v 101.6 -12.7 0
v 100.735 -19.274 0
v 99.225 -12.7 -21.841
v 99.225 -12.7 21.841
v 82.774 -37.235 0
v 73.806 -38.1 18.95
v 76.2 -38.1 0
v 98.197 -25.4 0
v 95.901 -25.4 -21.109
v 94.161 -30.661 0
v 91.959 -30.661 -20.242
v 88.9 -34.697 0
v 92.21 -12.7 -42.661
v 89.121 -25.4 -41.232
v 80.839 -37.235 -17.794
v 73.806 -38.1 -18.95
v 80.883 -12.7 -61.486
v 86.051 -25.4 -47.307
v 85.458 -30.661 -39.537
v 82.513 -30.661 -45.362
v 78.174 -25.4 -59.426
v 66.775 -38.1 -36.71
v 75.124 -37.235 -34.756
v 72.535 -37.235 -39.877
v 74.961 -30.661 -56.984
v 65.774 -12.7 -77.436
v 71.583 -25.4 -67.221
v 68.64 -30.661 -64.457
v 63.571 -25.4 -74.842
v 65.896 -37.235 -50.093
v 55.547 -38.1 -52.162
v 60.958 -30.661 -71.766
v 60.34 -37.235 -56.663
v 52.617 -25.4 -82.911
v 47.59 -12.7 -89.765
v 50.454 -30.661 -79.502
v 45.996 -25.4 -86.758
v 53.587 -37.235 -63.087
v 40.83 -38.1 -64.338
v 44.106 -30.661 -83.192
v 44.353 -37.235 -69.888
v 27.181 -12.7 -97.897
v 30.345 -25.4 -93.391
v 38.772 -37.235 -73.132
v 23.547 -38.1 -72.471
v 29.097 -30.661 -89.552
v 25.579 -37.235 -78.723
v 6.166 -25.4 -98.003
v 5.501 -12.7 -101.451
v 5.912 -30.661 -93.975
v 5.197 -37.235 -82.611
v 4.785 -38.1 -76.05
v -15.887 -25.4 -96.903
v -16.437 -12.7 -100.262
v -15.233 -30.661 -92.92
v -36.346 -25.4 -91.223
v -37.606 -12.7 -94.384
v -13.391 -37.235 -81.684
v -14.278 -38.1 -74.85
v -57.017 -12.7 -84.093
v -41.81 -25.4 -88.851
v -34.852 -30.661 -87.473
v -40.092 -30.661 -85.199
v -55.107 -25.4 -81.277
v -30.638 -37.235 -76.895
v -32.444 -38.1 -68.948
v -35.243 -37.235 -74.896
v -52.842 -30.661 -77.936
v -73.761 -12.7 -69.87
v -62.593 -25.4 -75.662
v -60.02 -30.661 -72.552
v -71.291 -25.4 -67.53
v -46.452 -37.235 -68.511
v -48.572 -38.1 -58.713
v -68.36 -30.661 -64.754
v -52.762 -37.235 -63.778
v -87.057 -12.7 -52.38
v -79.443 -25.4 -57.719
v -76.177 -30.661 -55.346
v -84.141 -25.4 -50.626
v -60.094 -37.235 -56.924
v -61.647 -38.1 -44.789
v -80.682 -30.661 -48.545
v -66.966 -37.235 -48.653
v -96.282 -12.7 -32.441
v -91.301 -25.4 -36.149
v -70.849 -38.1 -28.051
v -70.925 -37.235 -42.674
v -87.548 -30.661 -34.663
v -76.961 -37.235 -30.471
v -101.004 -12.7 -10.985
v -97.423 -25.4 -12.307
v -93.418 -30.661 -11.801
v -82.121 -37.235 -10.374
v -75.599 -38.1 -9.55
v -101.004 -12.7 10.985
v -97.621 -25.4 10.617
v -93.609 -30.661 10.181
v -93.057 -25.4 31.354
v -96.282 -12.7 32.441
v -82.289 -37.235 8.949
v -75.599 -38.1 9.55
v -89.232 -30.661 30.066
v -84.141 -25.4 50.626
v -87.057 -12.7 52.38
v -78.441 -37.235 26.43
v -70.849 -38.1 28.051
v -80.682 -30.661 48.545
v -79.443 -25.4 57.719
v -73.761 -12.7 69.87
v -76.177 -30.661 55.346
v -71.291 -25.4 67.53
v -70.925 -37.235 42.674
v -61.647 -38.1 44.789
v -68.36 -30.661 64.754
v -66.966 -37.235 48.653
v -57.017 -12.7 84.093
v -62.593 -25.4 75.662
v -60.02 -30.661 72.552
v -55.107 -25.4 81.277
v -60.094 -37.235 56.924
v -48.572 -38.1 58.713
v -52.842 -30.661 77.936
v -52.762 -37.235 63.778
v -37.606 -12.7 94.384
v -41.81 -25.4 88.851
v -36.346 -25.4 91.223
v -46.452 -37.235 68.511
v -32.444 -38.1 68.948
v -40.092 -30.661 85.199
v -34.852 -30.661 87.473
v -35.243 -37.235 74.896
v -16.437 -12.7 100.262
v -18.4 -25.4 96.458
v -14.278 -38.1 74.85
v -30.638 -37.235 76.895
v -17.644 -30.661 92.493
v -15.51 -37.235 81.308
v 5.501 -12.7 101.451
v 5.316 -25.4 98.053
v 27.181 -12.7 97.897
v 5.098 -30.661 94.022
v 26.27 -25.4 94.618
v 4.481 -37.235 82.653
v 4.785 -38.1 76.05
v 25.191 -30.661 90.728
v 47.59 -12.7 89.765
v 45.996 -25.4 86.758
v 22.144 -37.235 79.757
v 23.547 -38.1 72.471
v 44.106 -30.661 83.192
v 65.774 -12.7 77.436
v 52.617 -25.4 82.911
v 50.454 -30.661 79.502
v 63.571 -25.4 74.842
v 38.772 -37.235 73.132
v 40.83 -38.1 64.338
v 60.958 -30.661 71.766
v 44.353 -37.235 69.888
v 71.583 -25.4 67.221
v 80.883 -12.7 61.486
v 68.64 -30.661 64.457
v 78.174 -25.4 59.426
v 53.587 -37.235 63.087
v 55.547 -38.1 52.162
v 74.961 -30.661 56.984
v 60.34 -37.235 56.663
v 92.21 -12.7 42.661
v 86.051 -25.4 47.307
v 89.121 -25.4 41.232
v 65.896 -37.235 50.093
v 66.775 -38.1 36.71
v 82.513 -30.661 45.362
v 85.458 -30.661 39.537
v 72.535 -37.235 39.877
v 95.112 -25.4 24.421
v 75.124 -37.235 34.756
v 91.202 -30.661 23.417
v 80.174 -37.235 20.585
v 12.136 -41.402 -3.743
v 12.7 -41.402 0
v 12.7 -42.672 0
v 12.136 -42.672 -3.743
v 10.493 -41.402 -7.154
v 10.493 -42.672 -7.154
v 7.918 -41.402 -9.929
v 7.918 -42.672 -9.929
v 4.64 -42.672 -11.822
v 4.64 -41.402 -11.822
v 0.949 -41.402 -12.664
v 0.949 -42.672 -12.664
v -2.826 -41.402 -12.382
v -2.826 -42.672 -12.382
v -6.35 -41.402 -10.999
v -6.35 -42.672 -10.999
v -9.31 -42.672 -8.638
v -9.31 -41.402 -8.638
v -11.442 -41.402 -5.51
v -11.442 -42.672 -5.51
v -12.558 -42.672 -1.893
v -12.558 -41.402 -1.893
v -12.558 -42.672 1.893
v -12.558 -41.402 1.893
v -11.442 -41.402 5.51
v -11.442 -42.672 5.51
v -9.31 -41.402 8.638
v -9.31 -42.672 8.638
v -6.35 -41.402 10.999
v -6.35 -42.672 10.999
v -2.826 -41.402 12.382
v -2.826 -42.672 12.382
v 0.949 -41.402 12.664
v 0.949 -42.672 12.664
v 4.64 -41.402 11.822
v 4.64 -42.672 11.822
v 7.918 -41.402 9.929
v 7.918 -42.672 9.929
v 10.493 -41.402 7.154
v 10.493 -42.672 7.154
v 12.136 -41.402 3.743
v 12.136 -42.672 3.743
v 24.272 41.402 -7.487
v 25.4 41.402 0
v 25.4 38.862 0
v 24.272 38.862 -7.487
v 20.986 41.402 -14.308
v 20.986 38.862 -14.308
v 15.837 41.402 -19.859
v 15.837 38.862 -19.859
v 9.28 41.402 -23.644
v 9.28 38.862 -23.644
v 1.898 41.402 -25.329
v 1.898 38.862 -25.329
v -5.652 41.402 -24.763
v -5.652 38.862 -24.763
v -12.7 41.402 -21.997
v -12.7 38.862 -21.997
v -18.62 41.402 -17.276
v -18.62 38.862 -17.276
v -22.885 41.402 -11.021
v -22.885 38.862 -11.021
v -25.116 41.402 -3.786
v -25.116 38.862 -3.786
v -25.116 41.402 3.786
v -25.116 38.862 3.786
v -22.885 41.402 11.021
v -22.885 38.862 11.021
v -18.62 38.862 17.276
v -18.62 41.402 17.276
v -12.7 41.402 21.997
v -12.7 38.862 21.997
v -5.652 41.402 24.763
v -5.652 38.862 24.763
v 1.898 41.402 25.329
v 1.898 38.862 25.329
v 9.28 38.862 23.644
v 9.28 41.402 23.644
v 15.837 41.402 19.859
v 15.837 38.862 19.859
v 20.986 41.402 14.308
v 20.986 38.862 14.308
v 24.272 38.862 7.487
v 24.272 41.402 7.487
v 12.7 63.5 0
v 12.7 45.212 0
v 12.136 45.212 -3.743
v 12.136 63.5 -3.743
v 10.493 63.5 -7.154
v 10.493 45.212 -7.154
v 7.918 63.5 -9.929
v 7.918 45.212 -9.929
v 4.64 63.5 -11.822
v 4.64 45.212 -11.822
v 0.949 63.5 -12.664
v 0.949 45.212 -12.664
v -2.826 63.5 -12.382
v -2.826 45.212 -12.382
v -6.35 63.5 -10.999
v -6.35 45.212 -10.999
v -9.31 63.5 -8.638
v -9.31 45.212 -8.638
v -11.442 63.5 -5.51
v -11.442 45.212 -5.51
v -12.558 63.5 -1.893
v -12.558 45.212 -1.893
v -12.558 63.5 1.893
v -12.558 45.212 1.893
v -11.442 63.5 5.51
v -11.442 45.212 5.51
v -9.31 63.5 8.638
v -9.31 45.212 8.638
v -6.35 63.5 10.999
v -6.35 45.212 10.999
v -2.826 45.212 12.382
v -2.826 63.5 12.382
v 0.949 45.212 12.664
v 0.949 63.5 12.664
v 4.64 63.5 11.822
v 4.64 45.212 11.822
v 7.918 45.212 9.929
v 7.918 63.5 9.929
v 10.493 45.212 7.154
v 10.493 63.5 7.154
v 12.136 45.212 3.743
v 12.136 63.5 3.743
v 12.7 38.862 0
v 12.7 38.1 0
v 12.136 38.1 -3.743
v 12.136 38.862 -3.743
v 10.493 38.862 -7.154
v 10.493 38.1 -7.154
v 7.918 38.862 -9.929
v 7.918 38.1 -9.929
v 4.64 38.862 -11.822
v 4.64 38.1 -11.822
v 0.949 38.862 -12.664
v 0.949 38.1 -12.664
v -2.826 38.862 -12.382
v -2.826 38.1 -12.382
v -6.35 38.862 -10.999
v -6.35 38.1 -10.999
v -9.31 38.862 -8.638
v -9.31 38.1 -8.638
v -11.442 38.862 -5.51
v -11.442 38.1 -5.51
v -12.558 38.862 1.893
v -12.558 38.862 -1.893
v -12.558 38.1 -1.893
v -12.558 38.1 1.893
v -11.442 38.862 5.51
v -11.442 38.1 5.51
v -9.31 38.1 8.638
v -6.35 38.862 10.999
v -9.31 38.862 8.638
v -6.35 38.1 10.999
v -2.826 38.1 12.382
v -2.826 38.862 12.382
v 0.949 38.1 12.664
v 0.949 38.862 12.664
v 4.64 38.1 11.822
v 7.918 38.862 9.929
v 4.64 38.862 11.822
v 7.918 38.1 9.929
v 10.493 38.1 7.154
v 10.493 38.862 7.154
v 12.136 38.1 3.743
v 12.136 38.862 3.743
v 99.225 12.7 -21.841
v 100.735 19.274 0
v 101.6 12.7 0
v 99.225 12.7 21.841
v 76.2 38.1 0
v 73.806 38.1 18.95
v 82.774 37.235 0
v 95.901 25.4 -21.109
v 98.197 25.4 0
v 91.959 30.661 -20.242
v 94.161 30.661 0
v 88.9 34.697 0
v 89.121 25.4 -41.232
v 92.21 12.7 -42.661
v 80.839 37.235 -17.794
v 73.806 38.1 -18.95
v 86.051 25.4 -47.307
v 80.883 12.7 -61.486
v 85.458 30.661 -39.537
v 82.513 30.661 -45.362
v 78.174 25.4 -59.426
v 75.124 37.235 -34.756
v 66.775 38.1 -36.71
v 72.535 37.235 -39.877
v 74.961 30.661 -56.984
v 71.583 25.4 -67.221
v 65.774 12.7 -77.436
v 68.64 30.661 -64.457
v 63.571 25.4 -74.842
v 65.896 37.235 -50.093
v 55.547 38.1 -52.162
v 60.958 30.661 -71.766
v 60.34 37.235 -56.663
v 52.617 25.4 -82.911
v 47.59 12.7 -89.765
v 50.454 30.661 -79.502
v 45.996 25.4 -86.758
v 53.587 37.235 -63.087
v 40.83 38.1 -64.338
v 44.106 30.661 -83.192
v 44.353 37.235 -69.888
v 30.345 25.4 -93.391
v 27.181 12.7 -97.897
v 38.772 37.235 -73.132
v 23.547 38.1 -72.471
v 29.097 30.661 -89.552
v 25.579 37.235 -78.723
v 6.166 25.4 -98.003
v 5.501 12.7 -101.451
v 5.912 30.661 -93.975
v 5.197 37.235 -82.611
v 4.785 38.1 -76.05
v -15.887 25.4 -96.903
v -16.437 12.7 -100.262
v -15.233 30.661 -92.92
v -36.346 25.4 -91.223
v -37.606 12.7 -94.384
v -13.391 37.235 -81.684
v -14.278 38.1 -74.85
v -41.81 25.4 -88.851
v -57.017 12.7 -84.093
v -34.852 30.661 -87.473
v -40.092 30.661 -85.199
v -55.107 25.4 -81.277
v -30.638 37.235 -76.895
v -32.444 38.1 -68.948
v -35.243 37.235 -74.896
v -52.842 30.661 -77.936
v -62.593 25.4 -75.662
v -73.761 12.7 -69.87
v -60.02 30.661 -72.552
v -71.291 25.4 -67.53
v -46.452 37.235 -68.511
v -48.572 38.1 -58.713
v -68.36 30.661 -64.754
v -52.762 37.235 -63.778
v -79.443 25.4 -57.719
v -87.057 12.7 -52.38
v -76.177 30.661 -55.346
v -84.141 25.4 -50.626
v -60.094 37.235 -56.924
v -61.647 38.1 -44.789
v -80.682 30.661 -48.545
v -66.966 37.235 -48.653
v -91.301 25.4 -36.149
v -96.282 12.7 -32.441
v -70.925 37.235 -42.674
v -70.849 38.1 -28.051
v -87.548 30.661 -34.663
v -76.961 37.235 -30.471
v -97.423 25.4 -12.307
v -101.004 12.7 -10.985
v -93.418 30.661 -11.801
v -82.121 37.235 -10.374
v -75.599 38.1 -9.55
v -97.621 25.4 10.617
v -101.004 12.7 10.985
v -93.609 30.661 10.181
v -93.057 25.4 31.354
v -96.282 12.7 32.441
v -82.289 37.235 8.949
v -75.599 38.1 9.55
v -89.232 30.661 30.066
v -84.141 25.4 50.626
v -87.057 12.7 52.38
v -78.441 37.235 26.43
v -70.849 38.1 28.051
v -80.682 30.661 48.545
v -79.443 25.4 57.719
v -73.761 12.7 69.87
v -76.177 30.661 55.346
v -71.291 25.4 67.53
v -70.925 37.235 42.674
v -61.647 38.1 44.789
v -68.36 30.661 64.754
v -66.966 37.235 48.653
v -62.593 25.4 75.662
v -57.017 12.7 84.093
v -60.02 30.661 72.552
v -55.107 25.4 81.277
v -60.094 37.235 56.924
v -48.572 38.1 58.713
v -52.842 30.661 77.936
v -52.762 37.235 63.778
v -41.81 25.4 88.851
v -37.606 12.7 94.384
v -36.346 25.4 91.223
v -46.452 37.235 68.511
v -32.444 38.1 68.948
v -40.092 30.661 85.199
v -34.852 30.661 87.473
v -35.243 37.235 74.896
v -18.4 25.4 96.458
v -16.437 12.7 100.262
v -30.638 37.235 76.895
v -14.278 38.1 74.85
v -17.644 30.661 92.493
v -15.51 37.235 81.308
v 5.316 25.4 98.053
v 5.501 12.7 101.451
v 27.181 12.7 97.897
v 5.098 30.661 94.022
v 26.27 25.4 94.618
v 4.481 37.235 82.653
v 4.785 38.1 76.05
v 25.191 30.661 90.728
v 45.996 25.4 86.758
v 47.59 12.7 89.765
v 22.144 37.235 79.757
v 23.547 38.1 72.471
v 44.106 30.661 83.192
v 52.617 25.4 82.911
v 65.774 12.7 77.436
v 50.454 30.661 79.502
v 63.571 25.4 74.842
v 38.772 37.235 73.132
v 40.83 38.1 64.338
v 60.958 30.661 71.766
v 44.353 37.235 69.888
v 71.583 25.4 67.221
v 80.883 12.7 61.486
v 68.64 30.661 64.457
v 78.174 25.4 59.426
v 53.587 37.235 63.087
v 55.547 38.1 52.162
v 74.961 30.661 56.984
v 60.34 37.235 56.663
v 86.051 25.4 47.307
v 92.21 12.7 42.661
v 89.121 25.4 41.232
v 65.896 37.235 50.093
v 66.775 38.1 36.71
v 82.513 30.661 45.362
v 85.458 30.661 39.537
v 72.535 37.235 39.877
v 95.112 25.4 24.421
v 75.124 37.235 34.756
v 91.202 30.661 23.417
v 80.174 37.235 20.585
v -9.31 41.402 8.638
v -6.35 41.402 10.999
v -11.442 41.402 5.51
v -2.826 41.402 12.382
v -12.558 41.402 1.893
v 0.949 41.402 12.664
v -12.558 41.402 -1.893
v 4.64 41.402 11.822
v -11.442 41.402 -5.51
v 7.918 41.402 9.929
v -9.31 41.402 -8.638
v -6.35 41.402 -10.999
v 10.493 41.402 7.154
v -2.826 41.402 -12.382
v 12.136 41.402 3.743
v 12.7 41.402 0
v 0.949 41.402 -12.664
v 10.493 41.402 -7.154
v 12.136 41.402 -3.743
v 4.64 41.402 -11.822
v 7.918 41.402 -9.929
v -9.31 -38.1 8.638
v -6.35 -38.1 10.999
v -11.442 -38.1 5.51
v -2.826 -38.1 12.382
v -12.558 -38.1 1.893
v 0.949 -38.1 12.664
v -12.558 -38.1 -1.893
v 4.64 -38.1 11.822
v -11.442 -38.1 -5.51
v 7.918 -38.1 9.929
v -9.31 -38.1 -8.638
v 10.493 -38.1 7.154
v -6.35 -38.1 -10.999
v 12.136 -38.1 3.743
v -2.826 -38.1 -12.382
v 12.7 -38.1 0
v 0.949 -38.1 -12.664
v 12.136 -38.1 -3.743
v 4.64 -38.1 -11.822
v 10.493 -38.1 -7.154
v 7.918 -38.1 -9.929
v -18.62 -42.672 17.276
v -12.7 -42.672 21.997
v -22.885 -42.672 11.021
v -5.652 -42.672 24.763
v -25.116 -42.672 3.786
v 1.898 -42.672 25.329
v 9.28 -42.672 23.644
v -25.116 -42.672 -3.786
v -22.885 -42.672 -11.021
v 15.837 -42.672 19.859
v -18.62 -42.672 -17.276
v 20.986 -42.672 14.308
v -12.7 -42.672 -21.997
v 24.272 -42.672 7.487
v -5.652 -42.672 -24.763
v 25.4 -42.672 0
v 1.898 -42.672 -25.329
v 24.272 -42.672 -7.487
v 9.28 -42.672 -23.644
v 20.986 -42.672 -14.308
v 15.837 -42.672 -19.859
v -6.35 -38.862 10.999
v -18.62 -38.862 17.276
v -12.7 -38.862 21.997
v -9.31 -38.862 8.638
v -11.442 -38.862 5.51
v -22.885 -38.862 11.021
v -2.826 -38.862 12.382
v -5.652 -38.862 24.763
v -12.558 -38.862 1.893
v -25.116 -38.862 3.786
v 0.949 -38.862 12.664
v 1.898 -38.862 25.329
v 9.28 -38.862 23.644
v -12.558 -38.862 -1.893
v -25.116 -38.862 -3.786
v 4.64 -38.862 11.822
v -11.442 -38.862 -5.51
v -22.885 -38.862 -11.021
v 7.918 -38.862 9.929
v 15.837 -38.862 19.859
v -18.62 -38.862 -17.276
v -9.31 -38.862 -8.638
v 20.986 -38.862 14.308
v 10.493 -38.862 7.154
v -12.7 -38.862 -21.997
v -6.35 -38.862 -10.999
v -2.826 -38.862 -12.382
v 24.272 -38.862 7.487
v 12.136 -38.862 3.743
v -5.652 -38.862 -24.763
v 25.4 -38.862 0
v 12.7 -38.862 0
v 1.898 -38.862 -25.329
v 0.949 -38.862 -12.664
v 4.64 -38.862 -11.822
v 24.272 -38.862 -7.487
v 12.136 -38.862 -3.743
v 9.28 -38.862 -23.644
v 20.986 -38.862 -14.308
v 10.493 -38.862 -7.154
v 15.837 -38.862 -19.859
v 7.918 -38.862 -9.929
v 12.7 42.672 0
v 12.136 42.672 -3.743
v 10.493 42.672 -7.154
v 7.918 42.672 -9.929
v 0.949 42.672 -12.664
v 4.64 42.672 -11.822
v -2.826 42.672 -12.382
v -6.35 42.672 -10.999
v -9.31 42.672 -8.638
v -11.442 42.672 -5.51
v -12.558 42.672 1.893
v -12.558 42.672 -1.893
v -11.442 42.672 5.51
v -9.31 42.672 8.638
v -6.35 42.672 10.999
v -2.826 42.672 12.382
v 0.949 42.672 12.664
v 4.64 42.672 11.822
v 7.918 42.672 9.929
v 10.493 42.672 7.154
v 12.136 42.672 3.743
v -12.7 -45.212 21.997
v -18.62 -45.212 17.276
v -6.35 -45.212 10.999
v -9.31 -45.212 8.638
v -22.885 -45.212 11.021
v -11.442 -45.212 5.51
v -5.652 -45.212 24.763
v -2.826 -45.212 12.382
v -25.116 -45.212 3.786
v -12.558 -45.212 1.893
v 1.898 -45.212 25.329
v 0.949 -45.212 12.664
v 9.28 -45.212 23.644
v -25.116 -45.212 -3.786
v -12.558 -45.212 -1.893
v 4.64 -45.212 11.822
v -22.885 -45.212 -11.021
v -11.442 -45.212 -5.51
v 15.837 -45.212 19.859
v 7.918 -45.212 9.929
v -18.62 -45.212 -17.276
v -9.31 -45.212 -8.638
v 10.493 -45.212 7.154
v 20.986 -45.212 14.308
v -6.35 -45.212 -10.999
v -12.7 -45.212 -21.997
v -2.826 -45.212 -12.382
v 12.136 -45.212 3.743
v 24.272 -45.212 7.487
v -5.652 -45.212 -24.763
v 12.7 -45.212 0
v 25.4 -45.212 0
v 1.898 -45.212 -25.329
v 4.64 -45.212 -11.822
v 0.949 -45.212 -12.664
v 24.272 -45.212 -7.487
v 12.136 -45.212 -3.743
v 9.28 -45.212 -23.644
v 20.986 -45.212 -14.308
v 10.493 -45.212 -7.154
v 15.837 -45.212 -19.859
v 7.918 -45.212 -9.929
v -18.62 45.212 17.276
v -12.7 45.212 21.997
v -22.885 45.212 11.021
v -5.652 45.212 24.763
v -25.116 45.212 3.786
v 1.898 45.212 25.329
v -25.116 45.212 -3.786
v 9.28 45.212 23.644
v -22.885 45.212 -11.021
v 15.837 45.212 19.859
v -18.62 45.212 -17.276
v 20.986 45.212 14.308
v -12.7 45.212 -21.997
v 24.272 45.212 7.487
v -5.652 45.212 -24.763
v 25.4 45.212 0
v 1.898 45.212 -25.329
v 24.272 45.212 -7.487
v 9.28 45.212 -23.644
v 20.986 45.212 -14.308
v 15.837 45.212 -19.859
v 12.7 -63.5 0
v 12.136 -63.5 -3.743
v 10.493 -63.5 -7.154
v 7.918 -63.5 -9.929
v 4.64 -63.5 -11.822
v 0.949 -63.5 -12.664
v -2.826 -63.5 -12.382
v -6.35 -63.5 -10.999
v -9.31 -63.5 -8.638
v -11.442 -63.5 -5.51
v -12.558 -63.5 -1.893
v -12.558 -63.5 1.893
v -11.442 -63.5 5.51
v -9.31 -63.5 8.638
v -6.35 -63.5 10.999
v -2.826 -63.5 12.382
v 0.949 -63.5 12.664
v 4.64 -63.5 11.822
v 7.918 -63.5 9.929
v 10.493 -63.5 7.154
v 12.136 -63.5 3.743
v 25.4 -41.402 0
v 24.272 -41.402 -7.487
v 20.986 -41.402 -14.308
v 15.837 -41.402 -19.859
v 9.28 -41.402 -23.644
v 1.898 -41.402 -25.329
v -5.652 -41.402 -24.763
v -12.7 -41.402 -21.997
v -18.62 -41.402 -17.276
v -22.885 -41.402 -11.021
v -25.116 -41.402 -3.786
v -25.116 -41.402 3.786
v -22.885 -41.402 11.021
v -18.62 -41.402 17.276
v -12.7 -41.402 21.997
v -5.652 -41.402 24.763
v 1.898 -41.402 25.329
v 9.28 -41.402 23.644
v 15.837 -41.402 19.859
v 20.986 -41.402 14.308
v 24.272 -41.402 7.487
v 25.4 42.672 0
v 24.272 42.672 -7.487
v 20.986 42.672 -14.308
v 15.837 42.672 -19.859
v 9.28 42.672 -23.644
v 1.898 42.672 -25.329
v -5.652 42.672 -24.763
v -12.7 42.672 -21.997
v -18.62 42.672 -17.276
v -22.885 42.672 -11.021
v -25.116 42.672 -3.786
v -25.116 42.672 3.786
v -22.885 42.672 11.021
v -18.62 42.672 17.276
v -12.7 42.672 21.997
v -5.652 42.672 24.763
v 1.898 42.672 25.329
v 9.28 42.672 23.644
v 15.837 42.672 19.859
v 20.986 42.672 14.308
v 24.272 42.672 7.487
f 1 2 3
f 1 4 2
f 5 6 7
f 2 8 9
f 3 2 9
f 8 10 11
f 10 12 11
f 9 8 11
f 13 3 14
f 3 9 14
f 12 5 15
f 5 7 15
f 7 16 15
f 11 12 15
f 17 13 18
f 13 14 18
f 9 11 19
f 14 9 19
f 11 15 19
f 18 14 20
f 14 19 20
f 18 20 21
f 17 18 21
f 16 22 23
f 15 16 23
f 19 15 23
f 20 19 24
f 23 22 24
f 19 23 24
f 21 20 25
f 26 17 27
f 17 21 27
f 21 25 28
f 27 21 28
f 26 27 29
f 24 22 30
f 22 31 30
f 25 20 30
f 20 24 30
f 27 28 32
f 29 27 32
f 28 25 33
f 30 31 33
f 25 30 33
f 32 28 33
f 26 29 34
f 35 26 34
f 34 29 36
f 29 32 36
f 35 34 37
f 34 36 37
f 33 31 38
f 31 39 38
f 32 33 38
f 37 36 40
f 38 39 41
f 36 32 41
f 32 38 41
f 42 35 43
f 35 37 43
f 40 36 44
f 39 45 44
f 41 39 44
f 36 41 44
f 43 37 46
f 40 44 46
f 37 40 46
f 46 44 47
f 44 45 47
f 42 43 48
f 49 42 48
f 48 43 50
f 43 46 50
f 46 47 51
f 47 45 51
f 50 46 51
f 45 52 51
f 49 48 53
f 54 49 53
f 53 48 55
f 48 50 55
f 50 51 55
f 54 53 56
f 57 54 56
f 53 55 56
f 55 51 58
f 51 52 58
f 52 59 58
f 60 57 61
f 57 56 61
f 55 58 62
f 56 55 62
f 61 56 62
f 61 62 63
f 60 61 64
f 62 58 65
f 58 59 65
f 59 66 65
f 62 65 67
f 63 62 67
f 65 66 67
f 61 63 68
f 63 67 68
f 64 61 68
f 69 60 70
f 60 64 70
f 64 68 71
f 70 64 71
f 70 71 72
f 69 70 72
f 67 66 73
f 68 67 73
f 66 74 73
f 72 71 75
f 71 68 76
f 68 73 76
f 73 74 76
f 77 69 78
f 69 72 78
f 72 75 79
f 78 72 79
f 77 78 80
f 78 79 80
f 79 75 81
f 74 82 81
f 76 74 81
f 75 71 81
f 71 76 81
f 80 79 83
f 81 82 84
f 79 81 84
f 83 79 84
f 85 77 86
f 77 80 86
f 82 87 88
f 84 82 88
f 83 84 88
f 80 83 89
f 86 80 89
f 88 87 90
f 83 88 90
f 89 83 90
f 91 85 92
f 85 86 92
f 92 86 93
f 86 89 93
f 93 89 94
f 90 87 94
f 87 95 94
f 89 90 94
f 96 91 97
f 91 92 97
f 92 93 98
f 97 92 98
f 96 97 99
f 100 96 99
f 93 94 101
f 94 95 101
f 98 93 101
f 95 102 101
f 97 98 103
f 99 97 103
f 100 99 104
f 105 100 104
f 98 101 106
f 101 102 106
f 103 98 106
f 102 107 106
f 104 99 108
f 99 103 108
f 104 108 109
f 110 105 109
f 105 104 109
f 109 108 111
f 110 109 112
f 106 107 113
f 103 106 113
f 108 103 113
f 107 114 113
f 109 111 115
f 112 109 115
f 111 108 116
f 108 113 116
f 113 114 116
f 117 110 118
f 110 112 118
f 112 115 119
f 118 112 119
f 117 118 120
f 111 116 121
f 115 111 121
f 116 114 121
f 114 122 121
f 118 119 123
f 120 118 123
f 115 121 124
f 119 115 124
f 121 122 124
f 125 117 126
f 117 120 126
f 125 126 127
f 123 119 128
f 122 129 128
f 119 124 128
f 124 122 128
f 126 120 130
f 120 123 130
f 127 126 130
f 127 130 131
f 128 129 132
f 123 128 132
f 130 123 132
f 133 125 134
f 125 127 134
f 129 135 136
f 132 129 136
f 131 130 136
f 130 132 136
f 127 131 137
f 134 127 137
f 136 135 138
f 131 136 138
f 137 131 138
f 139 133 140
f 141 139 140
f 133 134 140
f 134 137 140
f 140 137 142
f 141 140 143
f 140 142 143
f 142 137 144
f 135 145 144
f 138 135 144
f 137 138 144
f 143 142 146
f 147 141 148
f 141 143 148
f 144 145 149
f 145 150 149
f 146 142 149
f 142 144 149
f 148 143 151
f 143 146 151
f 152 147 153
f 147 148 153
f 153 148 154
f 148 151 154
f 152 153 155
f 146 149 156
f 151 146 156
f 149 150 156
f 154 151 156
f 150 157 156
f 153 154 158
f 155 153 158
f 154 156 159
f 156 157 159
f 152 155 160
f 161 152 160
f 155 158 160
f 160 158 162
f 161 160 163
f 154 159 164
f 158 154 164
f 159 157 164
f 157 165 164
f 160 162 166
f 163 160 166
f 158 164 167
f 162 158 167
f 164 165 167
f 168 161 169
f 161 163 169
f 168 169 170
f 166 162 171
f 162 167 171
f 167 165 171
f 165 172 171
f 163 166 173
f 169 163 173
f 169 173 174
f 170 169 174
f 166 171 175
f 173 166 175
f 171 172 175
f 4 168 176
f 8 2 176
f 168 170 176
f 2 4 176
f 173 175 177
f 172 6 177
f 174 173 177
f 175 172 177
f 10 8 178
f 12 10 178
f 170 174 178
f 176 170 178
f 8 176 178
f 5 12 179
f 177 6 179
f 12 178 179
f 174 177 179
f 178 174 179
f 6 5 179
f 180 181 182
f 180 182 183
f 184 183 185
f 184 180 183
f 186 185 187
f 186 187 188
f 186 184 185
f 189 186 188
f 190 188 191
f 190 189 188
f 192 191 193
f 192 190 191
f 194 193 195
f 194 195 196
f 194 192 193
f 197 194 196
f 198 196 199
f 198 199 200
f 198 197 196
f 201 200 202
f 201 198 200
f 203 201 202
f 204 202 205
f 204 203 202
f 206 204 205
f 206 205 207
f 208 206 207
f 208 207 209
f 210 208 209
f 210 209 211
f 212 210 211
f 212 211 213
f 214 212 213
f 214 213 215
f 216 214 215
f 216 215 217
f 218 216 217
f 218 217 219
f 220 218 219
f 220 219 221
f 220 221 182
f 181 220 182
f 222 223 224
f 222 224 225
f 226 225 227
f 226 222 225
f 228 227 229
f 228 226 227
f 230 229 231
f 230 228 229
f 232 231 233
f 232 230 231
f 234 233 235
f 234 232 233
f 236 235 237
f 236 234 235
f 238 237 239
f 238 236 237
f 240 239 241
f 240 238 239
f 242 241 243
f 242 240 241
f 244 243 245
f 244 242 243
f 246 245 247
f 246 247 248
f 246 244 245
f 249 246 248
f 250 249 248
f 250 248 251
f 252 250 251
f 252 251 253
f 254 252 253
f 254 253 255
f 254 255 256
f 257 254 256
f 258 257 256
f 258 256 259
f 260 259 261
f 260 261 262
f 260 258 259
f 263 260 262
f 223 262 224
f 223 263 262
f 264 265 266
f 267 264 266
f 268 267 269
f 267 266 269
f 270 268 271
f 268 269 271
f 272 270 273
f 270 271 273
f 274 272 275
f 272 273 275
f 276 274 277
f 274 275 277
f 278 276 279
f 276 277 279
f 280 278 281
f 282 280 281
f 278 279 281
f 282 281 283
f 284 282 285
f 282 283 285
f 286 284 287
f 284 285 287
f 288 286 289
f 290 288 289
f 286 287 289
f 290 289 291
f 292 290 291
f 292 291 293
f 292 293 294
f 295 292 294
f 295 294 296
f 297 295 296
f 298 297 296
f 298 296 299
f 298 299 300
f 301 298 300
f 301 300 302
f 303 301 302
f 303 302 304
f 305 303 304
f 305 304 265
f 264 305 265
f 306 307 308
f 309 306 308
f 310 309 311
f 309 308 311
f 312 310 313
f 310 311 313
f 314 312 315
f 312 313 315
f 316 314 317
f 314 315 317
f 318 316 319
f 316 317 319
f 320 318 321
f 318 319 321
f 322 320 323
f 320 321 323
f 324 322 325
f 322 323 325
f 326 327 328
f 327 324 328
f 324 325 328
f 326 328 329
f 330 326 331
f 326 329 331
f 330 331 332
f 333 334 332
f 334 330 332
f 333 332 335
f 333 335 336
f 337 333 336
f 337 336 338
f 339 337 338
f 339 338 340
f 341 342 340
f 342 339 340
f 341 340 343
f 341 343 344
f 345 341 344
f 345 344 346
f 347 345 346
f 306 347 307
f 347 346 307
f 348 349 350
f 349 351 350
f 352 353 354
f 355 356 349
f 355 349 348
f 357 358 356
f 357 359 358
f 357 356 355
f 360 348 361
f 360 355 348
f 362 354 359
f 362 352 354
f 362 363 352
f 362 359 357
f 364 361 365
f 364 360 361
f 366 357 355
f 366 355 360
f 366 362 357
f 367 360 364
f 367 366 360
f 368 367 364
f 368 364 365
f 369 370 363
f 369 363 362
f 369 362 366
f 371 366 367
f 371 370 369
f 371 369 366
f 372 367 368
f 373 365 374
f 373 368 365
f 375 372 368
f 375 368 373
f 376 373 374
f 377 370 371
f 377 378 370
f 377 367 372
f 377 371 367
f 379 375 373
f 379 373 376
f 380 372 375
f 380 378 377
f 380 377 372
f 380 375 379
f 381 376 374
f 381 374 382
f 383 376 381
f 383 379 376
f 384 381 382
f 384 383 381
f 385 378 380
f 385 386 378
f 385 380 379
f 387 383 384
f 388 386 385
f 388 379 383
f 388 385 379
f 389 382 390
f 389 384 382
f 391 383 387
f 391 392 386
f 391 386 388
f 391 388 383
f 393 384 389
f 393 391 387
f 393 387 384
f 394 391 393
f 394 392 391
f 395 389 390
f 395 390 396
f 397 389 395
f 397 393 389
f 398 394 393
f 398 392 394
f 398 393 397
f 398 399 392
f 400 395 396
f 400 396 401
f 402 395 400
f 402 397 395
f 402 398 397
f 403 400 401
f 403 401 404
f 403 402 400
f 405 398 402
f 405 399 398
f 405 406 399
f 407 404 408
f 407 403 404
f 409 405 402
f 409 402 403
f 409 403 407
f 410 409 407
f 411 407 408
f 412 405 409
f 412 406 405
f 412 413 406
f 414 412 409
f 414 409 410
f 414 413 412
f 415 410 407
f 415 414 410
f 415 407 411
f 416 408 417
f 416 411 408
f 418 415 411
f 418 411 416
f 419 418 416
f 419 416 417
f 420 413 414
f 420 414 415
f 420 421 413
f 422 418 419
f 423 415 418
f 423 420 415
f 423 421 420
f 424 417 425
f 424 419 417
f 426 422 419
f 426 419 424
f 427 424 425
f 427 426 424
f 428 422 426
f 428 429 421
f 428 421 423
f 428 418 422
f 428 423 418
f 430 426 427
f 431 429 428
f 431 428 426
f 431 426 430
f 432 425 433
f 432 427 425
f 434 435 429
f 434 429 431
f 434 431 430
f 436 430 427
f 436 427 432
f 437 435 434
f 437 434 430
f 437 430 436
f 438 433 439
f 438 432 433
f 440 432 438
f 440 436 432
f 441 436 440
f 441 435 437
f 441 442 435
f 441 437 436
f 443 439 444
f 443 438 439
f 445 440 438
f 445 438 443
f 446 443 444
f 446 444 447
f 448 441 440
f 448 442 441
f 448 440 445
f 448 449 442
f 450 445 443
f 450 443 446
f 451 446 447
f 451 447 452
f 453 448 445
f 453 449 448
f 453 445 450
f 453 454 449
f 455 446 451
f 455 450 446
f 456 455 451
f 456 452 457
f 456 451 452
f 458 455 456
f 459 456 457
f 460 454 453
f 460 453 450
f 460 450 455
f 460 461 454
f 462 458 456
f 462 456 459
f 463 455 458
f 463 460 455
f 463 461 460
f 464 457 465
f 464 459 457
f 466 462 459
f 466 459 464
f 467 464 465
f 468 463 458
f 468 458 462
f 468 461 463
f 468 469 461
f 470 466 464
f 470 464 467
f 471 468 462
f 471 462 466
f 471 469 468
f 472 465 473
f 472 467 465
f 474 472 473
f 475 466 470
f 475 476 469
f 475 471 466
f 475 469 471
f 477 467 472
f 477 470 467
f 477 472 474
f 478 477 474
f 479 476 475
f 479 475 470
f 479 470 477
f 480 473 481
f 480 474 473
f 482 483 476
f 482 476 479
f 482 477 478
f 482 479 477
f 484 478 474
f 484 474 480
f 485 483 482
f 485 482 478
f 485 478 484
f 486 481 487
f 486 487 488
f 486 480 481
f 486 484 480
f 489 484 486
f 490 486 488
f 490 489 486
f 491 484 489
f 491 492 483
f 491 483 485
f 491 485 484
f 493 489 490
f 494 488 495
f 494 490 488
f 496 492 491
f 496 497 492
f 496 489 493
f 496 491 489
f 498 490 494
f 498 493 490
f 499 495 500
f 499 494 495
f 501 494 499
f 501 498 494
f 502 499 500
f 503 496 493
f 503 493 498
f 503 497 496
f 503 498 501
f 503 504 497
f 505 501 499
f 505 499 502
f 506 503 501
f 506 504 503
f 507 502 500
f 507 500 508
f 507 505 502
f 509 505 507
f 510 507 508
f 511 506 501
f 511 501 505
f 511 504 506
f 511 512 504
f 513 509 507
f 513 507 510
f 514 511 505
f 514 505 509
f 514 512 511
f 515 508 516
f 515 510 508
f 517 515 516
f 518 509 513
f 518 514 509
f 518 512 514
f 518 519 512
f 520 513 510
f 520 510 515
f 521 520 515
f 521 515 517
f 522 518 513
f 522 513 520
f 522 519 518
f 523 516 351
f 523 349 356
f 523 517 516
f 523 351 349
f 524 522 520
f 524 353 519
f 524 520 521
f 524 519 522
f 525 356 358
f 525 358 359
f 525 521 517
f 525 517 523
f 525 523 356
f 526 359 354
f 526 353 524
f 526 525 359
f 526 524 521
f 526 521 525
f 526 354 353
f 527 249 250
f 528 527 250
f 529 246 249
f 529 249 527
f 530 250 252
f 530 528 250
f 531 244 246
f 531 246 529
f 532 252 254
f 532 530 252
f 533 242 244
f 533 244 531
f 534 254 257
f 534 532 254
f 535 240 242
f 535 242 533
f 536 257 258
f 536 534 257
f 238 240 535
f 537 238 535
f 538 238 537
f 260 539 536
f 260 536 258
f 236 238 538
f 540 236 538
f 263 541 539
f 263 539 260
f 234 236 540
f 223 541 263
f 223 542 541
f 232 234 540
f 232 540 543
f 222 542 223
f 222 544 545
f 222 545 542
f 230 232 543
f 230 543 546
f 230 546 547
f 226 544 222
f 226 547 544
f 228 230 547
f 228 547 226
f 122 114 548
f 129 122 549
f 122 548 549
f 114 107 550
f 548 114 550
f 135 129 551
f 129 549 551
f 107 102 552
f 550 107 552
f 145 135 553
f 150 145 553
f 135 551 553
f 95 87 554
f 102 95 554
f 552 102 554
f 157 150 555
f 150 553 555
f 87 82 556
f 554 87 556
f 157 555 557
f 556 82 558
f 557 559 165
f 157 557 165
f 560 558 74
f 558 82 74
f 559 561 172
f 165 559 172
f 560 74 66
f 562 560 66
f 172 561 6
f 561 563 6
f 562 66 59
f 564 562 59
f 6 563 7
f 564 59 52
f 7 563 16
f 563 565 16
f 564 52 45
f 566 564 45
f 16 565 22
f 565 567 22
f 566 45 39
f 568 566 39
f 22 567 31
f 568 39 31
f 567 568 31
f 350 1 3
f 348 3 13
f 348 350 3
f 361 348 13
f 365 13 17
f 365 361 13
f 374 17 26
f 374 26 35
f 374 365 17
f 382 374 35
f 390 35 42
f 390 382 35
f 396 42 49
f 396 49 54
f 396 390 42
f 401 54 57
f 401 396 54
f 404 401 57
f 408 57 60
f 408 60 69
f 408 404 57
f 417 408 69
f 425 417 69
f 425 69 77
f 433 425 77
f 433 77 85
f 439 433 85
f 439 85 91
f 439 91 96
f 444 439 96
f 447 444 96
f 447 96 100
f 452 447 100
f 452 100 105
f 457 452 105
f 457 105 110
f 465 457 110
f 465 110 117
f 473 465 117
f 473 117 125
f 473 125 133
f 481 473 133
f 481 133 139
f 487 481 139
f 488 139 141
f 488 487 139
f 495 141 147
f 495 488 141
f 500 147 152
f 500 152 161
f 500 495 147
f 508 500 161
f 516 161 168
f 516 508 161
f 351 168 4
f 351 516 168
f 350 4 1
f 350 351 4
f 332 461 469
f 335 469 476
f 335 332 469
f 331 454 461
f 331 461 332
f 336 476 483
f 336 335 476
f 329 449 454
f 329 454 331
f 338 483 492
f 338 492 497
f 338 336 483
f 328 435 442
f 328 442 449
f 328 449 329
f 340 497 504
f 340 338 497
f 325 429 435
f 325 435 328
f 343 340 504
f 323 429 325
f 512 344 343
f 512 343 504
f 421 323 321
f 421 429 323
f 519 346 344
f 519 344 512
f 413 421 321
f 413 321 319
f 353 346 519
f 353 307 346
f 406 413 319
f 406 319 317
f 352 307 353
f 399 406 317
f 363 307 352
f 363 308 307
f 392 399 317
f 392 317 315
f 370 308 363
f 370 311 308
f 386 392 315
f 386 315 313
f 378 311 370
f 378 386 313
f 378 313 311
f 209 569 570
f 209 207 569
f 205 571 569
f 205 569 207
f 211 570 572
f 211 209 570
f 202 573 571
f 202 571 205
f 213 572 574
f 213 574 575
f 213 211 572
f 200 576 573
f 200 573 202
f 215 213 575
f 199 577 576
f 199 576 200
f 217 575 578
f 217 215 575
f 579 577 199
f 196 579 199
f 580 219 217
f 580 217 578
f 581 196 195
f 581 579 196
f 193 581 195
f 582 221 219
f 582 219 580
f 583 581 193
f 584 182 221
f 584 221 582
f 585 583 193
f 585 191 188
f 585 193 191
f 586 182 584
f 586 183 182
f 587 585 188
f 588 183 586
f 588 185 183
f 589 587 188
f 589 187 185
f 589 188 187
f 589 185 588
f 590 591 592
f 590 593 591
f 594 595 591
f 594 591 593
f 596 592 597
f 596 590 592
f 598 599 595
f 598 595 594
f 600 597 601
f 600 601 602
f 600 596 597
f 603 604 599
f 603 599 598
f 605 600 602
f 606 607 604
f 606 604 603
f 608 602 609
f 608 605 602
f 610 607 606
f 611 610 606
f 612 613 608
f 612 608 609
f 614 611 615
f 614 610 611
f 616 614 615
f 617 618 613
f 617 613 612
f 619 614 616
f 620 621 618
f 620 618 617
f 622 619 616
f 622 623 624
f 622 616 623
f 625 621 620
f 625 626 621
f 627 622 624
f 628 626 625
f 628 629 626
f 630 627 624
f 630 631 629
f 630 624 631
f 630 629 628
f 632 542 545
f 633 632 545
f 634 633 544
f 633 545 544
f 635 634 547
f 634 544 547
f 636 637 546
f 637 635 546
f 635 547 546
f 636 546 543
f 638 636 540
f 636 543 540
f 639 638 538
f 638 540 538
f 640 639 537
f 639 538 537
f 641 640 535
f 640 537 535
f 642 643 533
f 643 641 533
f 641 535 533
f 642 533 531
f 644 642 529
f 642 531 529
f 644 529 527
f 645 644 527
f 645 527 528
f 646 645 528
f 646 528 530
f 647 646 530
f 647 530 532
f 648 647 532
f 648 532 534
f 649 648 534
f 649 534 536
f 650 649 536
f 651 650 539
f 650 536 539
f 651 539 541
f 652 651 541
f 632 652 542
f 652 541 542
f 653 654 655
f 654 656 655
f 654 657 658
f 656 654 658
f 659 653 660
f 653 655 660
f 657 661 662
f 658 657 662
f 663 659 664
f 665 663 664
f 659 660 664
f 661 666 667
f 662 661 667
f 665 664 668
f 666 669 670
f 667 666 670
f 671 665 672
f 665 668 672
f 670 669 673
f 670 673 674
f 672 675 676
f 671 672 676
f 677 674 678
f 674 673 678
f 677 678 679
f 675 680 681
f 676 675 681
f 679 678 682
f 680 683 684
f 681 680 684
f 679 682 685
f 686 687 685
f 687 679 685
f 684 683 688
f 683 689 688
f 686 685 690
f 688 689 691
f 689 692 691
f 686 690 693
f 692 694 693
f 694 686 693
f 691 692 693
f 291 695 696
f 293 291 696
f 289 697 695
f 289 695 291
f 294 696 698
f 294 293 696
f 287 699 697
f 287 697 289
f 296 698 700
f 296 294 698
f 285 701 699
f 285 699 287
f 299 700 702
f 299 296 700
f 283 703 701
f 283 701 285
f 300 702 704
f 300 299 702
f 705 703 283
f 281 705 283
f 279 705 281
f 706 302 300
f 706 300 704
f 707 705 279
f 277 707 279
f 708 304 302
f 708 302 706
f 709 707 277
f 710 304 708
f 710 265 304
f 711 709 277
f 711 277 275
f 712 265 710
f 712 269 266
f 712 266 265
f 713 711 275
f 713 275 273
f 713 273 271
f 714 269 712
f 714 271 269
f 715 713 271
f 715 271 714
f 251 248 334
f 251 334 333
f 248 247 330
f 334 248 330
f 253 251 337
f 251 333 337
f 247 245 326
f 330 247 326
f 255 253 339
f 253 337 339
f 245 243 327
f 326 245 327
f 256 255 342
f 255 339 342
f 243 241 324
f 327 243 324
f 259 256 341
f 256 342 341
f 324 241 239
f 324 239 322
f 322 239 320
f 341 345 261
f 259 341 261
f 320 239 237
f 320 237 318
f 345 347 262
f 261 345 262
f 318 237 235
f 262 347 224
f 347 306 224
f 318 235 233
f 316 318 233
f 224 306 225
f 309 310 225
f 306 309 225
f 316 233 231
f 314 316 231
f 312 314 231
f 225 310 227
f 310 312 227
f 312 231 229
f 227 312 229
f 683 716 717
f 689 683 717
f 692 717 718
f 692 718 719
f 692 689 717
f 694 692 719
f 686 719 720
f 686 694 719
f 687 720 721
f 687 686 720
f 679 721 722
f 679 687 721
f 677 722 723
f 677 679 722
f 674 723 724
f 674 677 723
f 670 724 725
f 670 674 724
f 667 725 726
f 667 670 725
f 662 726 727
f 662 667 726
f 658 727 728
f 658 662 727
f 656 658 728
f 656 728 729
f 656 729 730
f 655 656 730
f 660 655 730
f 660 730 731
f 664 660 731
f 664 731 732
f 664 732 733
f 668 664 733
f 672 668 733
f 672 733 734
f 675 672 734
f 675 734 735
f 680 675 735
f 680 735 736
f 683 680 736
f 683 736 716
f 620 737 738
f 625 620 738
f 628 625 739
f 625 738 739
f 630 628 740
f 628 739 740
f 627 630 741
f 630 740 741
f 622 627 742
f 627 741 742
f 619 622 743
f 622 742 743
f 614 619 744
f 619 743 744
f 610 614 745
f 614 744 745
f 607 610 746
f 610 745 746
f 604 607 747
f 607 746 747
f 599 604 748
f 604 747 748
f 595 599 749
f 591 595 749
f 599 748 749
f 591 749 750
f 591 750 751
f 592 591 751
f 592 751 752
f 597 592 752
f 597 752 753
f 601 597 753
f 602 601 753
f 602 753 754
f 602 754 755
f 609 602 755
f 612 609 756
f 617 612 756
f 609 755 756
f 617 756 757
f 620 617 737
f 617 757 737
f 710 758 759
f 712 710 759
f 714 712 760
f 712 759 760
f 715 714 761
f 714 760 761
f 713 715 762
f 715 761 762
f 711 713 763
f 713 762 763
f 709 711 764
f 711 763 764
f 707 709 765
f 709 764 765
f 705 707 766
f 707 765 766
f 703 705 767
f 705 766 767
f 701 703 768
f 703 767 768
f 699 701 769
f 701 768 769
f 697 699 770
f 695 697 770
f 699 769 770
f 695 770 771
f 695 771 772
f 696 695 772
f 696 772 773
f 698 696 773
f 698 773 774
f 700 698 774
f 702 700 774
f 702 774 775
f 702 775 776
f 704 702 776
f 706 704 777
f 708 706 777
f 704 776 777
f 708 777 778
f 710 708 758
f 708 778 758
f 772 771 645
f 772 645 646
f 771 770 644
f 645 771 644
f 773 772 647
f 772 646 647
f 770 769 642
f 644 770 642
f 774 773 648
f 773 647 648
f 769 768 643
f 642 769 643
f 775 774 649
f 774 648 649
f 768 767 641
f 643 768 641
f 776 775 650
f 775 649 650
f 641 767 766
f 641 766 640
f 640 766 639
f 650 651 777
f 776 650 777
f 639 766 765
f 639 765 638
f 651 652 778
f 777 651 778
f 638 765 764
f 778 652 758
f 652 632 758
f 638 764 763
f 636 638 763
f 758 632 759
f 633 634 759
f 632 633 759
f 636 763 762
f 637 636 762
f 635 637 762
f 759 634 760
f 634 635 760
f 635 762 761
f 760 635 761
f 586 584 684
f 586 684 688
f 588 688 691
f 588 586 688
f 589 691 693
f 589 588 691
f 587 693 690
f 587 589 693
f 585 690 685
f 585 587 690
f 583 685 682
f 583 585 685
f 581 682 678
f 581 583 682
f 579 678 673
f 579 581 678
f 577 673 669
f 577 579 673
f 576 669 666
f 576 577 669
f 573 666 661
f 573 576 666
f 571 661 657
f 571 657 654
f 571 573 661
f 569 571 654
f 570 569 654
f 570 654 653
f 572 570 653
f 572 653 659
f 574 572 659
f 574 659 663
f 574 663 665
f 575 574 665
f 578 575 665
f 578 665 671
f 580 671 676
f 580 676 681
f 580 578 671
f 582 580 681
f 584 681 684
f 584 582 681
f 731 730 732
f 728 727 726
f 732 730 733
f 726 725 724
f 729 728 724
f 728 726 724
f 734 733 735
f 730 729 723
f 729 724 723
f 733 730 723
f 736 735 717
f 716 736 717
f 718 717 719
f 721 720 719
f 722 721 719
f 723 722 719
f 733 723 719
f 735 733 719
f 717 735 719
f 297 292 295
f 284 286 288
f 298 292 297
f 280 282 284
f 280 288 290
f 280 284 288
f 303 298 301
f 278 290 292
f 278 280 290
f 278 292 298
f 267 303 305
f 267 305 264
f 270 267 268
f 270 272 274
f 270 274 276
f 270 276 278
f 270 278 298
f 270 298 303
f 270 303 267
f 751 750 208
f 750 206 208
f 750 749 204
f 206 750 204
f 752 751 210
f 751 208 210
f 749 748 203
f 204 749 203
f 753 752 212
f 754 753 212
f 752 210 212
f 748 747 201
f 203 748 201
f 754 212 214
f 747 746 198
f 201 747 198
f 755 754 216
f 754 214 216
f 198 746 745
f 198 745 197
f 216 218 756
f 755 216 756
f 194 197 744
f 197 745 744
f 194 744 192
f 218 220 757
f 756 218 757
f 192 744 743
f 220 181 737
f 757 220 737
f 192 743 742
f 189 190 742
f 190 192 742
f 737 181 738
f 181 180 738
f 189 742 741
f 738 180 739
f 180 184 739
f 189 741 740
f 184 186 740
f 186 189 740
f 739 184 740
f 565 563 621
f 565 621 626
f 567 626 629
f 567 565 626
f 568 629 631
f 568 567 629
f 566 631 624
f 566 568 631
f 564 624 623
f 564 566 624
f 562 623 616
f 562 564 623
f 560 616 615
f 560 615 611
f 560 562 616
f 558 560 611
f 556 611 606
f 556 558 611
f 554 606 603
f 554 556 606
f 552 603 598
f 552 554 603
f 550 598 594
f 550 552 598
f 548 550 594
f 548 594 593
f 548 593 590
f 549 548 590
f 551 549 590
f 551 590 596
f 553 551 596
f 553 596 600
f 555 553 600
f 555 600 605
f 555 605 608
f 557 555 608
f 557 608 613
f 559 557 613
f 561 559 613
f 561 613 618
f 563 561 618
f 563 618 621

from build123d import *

# Parameters (mm, degrees)
BOSS_EXTRUDE1_DEPTH      = 38.1
BOSS_EXTRUDE1_DEPTH_BACK = 38.1
SKETCH1_R                = 101.6
SKETCH2_R                = 12.7
CUT_EXTRUDE1_DEPTH       = 76.2
FILLET1_R                = 25.4
BOSS_EXTRUDE2_DEPTH      = 63.5
BOSS_EXTRUDE2_DEPTH_BACK = 63.5
SKETCH3_R                = 12.7
SKETCH4_R                = 25.4
BOSS_EXTRUDE3_DEPTH      = 2.54
BOSS_EXTRUDE4_START      = -2.54
SKETCH5_R                = 25.4
BOSS_EXTRUDE4_DEPTH      = 2.54


with BuildPart() as part:
    # Sketch1 → Boss-Extrude1 (new, two sides: drawn at the far end of the back side and taken through both)
    with BuildSketch(Plane(origin=(0, 0, 0), x_dir=(1, 0, 0), z_dir=(0, 1, 0)).offset(-BOSS_EXTRUDE1_DEPTH_BACK)):
        Circle(SKETCH1_R)
    extrude(amount=BOSS_EXTRUDE1_DEPTH + BOSS_EXTRUDE1_DEPTH_BACK)

    # Sketch2 → Cut-Extrude1 (cut)
    with BuildSketch(Plane.XZ.offset(38.1)):
        Circle(SKETCH2_R)
    extrude(amount=-CUT_EXTRUDE1_DEPTH, mode=Mode.SUBTRACT)

    # Fillet1
    fillet1_edges = [part.edges().sort_by_distance(p)[0] for p in [
        (-101.6, 38.1, 0),
        (-101.6, -38.1, 0),
    ]]
    fillet(fillet1_edges, radius=FILLET1_R)

    # Sketch3 → Boss-Extrude2 (add, two sides: drawn at the far end of the back side and taken through both)
    with BuildSketch(Plane(origin=(0, 0, 0), x_dir=(1, 0, 0), z_dir=(0, 1, 0)).offset(-BOSS_EXTRUDE2_DEPTH_BACK)):
        Circle(SKETCH3_R)
    extrude(amount=BOSS_EXTRUDE2_DEPTH + BOSS_EXTRUDE2_DEPTH_BACK)

    # Sketch4 → Boss-Extrude3 (add)
    with BuildSketch(Plane(origin=(0, 42.672, 0), x_dir=(1, 0, 0), z_dir=(0, 1, 0))):
        Circle(SKETCH4_R)
    boss_extrude3 = extrude(amount=BOSS_EXTRUDE3_DEPTH)

    # Sketch5 → Boss-Extrude4 (add)
    with BuildSketch(Plane(origin=(0, 41.402, 0), x_dir=(1, 0, 0), z_dir=(0, 1, 0)).offset(BOSS_EXTRUDE4_START)):
        Circle(SKETCH5_R)
    boss_extrude4 = extrude(amount=BOSS_EXTRUDE4_DEPTH)

    # Mirror1: Boss-Extrude3, Boss-Extrude4 across plane
    add(boss_extrude3.mirror(Plane.ZX))
    add(boss_extrude4.mirror(Plane.ZX))


solid = part.part
